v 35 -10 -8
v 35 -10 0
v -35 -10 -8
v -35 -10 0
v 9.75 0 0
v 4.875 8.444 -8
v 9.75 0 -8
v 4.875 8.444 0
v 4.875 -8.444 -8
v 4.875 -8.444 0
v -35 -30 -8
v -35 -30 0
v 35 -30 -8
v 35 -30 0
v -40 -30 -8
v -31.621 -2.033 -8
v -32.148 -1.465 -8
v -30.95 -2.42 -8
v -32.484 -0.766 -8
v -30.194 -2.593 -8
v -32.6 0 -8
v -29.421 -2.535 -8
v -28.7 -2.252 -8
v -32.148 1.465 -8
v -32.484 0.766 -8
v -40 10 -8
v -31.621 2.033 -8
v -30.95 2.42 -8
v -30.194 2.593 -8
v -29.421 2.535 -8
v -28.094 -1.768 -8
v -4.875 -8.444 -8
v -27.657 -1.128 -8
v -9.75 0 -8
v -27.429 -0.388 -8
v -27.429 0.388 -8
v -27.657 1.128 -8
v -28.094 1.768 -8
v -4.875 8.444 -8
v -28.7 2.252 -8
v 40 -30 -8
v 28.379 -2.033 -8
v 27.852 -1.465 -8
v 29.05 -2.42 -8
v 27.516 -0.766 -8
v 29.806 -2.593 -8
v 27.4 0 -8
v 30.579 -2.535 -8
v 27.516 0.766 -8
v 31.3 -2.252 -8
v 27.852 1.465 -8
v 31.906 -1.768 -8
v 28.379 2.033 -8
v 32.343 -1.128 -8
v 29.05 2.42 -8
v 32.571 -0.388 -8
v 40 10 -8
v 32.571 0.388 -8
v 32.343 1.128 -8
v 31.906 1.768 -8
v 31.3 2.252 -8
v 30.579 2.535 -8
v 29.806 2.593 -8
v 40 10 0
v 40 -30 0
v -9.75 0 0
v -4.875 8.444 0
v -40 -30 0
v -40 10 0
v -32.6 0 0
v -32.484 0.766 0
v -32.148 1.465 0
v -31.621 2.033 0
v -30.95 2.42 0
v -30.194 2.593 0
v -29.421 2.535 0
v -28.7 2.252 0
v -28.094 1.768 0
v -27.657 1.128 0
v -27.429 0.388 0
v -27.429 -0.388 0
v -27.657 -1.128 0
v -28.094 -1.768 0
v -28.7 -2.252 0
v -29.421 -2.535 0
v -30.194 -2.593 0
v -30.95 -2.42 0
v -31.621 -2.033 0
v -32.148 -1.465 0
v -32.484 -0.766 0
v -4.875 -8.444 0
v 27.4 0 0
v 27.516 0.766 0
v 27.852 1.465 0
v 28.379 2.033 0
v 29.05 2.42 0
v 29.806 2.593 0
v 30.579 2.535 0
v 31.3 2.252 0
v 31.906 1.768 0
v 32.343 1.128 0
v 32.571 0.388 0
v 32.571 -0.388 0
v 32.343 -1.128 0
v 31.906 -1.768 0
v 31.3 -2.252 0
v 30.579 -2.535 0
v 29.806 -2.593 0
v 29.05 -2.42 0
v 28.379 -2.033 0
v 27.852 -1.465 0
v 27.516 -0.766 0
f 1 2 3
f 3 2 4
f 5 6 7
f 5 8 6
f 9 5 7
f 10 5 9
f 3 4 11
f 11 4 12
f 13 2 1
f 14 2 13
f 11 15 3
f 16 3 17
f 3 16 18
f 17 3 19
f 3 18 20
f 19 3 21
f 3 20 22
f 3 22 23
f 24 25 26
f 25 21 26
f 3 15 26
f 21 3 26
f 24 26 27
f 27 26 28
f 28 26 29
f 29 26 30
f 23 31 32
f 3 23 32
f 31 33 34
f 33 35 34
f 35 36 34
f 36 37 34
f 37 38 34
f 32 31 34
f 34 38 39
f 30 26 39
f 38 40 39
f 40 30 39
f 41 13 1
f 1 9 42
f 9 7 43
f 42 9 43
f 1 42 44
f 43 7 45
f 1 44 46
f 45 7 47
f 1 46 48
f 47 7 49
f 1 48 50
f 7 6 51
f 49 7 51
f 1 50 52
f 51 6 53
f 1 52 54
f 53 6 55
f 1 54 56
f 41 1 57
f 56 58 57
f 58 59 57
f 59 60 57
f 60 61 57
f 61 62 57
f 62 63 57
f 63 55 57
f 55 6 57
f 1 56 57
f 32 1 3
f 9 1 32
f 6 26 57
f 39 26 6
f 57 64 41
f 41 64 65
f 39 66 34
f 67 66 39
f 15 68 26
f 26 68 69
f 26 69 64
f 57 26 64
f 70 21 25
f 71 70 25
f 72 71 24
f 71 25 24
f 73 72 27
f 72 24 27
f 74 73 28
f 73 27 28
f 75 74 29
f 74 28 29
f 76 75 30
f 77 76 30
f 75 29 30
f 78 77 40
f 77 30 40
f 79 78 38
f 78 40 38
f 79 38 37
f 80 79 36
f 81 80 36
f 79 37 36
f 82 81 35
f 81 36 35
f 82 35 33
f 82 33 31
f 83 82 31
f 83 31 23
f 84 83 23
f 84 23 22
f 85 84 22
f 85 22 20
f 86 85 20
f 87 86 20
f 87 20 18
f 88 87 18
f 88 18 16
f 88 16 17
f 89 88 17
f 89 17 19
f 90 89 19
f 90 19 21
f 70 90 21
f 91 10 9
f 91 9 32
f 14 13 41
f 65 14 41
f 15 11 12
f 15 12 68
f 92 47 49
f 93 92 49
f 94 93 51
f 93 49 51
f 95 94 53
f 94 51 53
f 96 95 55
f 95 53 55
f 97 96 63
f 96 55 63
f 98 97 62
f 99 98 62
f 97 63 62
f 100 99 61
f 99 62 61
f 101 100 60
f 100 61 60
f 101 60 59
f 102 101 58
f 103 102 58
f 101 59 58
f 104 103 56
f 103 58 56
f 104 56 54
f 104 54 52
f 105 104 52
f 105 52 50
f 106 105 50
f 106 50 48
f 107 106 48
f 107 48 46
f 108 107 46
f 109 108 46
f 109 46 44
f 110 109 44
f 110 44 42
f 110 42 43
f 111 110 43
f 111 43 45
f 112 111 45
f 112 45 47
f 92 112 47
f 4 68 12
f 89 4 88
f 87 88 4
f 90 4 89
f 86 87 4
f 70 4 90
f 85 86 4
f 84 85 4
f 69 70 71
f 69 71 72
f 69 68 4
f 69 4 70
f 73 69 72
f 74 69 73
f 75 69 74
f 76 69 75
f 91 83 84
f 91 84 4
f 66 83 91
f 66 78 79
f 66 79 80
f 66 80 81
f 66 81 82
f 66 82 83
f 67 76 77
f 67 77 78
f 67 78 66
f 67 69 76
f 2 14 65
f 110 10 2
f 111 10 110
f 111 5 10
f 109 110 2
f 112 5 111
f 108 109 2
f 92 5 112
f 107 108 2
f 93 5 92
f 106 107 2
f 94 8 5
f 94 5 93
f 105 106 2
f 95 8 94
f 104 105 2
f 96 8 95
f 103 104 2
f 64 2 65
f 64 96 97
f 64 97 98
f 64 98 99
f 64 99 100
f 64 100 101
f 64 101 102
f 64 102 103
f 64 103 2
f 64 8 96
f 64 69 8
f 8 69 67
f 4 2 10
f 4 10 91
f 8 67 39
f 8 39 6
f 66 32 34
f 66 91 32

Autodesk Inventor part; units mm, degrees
ref_plane "YZ Plane" through (0, 0, 0) normal (1, 0, 0) x (0, 1, 0)
ref_plane "XZ Plane" through (0, 0, 0) normal (0, 1, 0) x (-1, 0, 0)
ref_plane "XY Plane" through (0, 0, 0) normal (0, 0, 1) x (1, 0, 0)
sketch "Sketch1" plane through (0, 0, 0) normal (0, 0, 1) x (1, 0, 0)
  line L0 (40, -10) -> (-40, -10)
  line L1 (-40, -10) -> (-40, 10)
  line L2 (-40, 10) -> (40, 10)
  line L3 (40, 10) -> (40, -10)
  line L4 (0, -14) -> (0, 14) projected
  line L5 (40, -10) -> (30, -10)
  line L6 (-56, 0) -> (56, 0) projected
  circle A0 centre (-0.5449, 0.9437) radius 3.3235 projected
  line L7 (-4.875, -6.5563) -> (-9.2051, 0.9437) projected
  line L8 (-9.2051, 0.9437) -> (-4.875, 8.4437) projected
  line L9 (-4.875, 8.4437) -> (3.7853, 8.4437) projected
  line L10 (3.7853, 8.4437) -> (8.1154, 0.9437) projected
  line L11 (8.1154, 0.9437) -> (3.7853, -6.5563) projected
  line L12 (3.7853, -6.5563) -> (-4.875, -6.5563) projected
  circle A1 centre (-0.5449, 0.9437) radius 3.3235 projected
  line L13 (-4.875, -6.5563) -> (-9.2051, 0.9437) projected
  line L14 (-9.2051, 0.9437) -> (-4.875, 8.4437) projected
  line L15 (-4.875, 8.4437) -> (3.7853, 8.4437) projected
  line L16 (3.7853, 8.4437) -> (8.1154, 0.9437) projected
  line L17 (8.1154, 0.9437) -> (3.7853, -6.5563) projected
  line L18 (3.7853, -6.5563) -> (-4.875, -6.5563) projected
  point P0 (0, 0)
  dimension "d0" = 80
  dimension "d1" = 20
  dimension "d70" = 40
  dimension "d73" = 10
extrude "Extrusion1" add sketch "Sketch1" against normal blind 8
sketch "Sketch3" plane through (0, 0, 0) normal (0, 0, 1) x (1, 0, 0)
  line L0 (0, -14) -> (0, 14) projected
  line L1 (-56, 0) -> (56, 0) projected
  line L2 (-4.875, 8.4437) -> (4.875, 8.4437)
  line L3 (4.875, 8.4437) -> (9.75, 0)
  line L4 (9.75, 0) -> (4.875, -8.4437)
  line L5 (4.875, -8.4437) -> (-4.875, -8.4437)
  line L6 (-4.875, -8.4437) -> (-9.75, 0)
  line L7 (-9.75, 0) -> (-4.875, 8.4437)
  point P0 (0, 0)
  point P1 (0, 0)
  dimension "d65" = 19.5
extrude "Extrusion2" cut sketch "Sketch3" against normal blind 10
sketch "Sketch9" plane through (0, 0, -8) normal (0, 0, -1) x (-1, 0, 0)
  circle A0 centre (-30, 0) radius 2.6
  line L0 (0, -14) -> (0, 14) projected
  line L1 (56, 0) -> (-56, 0) projected
  circle A1 centre (30, 0) radius 2.6
  dimension "d40" = 5.2
  dimension "d41" = 60
extrude "Extrusion3" cut sketch "Sketch9" against normal through all
sketch "Sketch14" plane through (0, 0, 0) normal (0, 0, 1) x (1, 0, 0)
  circle A0 centre (30, 0) radius 2.6 projected
  circle A1 centre (-30, 0) radius 2.6 projected
  line L0 (-9.75, 0) -> (-4.875, 8.4437) projected
  line L1 (-4.875, 8.4437) -> (4.875, 8.4437) projected
  line L2 (4.875, 8.4437) -> (9.75, 0) projected
  line L3 (9.75, 0) -> (4.875, -8.4437) projected
  line L4 (4.875, -8.4437) -> (-4.875, -8.4437) projected
  line L5 (-4.875, -8.4437) -> (-9.75, 0) projected
  line L6 (40, -10) -> (-40, -10) projected
  line L7 (40, 10) -> (40, -10) projected
  line L8 (-40, 10) -> (40, 10) projected
  line L9 (-40, -10) -> (-40, 10) projected
  line L10 (-40, -10) -> (-35, -10)
  line L11 (-35, -10) -> (-35, -30)
  line L12 (-35, -30) -> (-40, -30)
  line L13 (-40, -30) -> (-40, -10)
  line L14 (-56, 0) -> (56, 0) projected
  line L15 (0, -33.313) -> (0, 17.2188) projected
  line L16 (40, -10) -> (35, -10)
  line L17 (35, -10) -> (35, -30)
  line L18 (35, -30) -> (40, -30)
  line L19 (40, -30) -> (40, -10)
  point P0 (0, 0)
  dimension "d74" = 5
  dimension "d75" = 20
extrude "Extrusion7" add sketch "Sketch14" against normal blind 8 contours L19 L18 L17 L6 | L11 L12 L13 L6
properties part number "drive_support" material "ABS Plastic"
